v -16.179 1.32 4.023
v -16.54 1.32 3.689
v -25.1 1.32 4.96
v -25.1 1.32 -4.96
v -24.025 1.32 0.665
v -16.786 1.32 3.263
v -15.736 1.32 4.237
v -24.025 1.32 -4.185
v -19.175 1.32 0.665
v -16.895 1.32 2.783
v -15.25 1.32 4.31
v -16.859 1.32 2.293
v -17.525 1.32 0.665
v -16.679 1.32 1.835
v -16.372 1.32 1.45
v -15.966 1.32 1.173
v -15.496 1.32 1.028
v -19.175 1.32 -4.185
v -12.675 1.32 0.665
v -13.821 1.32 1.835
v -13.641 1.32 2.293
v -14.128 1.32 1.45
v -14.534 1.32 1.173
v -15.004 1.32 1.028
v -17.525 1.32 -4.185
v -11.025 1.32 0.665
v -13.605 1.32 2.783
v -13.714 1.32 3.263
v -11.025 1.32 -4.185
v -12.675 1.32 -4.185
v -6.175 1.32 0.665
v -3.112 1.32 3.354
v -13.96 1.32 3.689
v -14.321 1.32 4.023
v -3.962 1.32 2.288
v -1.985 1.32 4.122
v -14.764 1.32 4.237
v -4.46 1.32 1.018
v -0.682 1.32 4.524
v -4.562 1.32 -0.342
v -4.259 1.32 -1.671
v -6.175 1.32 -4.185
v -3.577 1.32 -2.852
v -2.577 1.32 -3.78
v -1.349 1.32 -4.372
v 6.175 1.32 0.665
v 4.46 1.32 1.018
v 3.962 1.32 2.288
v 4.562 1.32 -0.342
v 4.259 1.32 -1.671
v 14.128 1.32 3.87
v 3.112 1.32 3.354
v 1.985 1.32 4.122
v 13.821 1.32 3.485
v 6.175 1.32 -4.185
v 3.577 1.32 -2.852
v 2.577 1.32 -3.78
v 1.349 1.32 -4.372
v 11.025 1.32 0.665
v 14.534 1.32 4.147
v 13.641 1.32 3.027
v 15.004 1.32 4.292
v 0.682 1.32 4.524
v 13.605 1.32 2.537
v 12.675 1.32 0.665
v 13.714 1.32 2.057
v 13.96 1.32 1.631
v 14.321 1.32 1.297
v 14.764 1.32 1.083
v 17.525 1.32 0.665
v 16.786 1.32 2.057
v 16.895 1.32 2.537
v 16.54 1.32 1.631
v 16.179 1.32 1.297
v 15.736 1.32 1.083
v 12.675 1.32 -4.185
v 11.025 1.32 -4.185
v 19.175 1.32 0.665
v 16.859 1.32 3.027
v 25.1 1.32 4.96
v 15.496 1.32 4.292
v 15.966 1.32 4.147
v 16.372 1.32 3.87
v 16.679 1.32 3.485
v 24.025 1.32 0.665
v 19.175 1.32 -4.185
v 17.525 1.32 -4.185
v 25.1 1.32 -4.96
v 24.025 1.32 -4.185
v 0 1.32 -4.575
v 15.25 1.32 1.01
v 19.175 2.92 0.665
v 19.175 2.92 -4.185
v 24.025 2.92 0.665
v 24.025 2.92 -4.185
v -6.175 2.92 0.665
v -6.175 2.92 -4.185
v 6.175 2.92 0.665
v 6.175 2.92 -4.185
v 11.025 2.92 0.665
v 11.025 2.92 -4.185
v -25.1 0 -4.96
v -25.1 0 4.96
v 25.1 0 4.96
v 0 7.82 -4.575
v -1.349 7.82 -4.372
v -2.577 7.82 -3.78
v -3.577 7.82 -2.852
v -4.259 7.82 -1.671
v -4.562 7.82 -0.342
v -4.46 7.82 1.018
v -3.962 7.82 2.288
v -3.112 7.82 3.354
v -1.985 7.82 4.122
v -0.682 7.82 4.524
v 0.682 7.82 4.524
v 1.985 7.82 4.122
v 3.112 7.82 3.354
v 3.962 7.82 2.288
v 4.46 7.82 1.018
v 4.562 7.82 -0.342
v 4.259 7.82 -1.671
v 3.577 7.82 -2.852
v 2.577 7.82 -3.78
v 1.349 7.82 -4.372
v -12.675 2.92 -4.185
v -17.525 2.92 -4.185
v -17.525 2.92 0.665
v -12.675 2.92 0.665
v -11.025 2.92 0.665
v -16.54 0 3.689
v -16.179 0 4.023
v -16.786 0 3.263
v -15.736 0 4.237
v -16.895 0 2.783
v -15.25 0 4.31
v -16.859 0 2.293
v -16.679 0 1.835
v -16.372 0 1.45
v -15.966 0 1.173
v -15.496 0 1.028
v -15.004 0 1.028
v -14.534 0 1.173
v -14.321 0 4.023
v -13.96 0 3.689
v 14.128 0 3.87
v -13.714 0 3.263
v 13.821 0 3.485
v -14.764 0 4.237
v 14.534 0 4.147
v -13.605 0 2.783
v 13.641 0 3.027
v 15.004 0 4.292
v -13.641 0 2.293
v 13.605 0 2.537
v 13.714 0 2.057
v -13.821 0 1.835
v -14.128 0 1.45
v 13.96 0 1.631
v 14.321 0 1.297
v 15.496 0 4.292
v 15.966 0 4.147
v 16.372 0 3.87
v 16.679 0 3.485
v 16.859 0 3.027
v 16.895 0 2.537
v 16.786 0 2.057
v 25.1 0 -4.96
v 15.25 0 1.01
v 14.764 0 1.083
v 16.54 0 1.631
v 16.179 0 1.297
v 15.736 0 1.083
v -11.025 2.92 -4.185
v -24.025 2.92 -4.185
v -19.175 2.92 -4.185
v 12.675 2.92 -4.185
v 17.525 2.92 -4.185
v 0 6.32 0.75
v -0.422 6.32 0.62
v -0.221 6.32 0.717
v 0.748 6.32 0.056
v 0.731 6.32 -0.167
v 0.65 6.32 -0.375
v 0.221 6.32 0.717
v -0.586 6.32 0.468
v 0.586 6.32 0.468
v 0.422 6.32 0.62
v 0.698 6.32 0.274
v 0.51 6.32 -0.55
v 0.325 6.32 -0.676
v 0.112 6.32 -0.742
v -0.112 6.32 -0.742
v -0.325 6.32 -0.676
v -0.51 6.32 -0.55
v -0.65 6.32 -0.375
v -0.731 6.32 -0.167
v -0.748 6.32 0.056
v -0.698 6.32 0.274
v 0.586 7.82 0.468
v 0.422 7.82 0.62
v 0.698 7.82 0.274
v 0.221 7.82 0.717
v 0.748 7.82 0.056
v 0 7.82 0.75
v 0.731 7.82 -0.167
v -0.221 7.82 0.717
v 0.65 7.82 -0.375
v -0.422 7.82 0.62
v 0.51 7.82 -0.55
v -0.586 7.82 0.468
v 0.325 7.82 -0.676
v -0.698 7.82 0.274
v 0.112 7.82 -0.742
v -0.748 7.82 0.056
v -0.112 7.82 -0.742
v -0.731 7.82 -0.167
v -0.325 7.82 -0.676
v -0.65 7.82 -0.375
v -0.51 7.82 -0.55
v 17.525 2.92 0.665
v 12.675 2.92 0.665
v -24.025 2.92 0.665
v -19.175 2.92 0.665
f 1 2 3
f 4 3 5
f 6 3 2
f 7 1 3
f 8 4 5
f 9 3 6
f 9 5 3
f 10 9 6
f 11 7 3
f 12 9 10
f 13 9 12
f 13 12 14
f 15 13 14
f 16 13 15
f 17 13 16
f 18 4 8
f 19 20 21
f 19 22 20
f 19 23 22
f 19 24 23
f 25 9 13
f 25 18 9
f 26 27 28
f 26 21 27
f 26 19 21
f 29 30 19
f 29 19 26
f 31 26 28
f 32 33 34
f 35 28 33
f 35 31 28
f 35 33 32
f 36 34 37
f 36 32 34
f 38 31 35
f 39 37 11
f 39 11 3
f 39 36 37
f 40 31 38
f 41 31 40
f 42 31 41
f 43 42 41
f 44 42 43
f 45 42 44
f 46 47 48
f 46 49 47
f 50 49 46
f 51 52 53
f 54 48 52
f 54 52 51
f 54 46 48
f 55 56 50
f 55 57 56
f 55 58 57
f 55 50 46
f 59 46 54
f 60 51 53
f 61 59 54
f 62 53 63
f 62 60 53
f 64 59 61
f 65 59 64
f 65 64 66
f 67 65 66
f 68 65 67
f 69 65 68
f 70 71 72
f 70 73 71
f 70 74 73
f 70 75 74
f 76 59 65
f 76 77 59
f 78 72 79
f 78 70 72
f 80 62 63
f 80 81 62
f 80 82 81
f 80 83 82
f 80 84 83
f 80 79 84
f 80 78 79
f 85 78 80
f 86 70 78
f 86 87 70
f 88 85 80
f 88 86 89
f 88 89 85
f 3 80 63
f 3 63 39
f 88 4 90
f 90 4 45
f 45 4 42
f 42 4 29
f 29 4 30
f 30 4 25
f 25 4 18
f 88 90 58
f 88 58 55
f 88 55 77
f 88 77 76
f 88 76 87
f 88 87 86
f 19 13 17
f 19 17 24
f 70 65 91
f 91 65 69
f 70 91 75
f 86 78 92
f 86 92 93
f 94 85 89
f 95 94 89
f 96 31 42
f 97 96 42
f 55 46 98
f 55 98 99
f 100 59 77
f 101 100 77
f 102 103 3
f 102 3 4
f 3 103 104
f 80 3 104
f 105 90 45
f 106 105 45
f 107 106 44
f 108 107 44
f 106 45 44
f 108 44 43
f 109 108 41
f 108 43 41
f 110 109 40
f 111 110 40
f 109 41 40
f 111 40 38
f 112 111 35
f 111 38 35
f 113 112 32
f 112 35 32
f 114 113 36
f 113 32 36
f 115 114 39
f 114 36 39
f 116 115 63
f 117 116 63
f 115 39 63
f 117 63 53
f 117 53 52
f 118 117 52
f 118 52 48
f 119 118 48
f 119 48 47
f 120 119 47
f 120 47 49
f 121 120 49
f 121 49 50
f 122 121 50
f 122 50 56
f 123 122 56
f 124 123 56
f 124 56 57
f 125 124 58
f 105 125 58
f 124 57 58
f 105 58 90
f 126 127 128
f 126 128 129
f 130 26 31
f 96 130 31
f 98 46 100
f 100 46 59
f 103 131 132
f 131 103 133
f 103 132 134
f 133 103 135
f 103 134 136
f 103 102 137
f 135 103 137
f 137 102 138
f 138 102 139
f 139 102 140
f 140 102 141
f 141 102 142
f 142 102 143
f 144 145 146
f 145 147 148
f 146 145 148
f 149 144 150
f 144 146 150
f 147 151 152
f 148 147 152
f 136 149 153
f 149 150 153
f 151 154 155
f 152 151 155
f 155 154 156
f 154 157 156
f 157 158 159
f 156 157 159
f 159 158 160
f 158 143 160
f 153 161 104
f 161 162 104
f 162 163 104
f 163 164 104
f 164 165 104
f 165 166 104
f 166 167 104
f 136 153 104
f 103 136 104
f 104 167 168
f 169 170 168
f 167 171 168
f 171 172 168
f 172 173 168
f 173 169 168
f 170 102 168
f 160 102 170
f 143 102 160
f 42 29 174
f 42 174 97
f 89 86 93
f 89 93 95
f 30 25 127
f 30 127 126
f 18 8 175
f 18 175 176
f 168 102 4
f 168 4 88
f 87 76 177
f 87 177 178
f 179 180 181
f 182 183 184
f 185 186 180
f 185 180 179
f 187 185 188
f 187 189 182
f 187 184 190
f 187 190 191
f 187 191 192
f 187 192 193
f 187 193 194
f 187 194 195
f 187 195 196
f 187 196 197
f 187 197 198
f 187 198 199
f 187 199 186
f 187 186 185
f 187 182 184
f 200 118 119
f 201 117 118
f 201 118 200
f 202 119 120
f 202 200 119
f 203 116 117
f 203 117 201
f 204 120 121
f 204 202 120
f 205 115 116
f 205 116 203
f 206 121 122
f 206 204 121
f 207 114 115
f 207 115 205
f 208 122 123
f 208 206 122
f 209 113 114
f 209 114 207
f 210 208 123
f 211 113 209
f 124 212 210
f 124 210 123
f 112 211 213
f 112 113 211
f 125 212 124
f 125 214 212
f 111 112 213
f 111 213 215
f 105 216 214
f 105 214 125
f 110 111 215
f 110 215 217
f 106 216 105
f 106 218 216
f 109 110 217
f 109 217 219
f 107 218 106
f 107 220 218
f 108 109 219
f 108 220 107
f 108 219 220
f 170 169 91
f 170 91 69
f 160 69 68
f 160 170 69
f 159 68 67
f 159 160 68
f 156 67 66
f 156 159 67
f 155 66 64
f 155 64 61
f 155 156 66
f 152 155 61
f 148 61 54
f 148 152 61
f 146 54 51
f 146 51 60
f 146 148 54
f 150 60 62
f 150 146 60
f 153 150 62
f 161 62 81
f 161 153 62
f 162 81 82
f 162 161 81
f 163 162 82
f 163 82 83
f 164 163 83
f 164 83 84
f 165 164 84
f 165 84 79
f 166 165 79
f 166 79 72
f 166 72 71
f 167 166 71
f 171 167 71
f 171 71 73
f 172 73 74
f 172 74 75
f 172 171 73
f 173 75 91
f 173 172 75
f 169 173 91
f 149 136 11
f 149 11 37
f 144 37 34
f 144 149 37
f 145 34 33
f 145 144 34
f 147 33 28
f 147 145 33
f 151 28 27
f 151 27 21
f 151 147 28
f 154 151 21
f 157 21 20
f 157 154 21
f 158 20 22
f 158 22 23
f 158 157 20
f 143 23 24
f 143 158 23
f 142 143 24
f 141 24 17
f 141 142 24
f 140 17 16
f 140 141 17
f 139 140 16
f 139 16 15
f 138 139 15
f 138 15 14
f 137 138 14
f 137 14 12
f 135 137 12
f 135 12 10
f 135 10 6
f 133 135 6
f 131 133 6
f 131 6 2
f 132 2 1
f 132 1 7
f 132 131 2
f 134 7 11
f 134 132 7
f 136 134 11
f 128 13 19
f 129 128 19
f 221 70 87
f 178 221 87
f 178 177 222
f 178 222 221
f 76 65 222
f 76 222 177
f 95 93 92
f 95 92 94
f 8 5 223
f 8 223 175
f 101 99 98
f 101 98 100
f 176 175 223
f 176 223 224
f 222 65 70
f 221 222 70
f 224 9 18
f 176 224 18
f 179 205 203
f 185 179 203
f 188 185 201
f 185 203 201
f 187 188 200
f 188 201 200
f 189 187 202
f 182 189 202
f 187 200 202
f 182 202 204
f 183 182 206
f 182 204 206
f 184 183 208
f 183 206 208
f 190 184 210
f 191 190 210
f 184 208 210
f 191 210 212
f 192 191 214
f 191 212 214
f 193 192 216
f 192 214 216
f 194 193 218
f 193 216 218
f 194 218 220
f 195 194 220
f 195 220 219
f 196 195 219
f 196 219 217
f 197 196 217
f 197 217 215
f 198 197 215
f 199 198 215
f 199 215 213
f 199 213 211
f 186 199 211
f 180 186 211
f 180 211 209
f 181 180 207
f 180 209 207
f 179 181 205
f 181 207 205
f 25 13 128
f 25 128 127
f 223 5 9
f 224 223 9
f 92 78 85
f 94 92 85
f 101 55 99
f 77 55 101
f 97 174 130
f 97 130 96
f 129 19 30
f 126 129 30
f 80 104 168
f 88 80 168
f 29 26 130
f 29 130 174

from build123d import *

# Parameters (mm, degrees)
SKETCH1_W           = 50.2
SKETCH1_H           = 9.92
SKETCH1_R           = 1.65
BOSS_EXTRUDE1_DEPTH = 1.32
SKETCH2_R           = 4.575
BOSS_EXTRUDE2_DEPTH = 6.5
SKETCH3_R           = 0.75
CUT_EXTRUDE1_DEPTH  = 1.5
SKETCH4_W           = 4.85
SKETCH4_H           = 4.85
BOSS_EXTRUDE3_DEPTH = 1.6


with BuildPart() as part:
    # Sketch1 → Boss-Extrude1 (new body)
    with BuildSketch(Plane(origin=(0, 0, 0), x_dir=(1, 0, 0), z_dir=(0, 1, 0))):
        Rectangle(SKETCH1_W, SKETCH1_H)
        with Locations(Location((-15.25, -2.66, 0), (0, 0, 270))):
            Circle(SKETCH1_R, mode=Mode.SUBTRACT)
        with Locations(Location((15.25, -2.66, 0), (0, 0, 90))):
            Circle(SKETCH1_R, mode=Mode.SUBTRACT)
    extrude(amount=BOSS_EXTRUDE1_DEPTH)

    # Sketch2 → Boss-Extrude2 (add)
    with BuildSketch(Plane(origin=(0, 1.32, 0), x_dir=(1, 0, 0), z_dir=(0, 1, 0))):
        with Locations(Location((0, 0, 0), (0, 0, 90))):
            Circle(SKETCH2_R)
    extrude(amount=BOSS_EXTRUDE2_DEPTH)

    # Sketch3 → Cut-Extrude1 (cut)
    with BuildSketch(Plane(origin=(0, 7.82, 0), x_dir=(1, 0, 0), z_dir=(0, 1, 0))):
        with Locations(Location((0, 0, 0), (0, 0, 270))):
            Circle(SKETCH3_R)
    extrude(amount=-CUT_EXTRUDE1_DEPTH, mode=Mode.SUBTRACT)

    # Sketch4 → Boss-Extrude3 (add)
    with BuildSketch(Plane(origin=(0, 1.32, 0), x_dir=(1, 0, 0), z_dir=(0, 1, 0))):
        with Locations((-8.6, 1.76)):
            Rectangle(SKETCH4_W, SKETCH4_H)
        with Locations((-15.1, 1.76)):
            Rectangle(SKETCH4_W, SKETCH4_H)
        with Locations((-21.6, 1.76)):
            Rectangle(SKETCH4_W, SKETCH4_H)
        with Locations((8.6, 1.76)):
            Rectangle(SKETCH4_W, SKETCH4_H)
        with Locations((15.1, 1.76)):
            Rectangle(SKETCH4_W, SKETCH4_H)
        with Locations((21.6, 1.76)):
            Rectangle(SKETCH4_W, SKETCH4_H)
    extrude(amount=BOSS_EXTRUDE3_DEPTH)


solid = part.part
